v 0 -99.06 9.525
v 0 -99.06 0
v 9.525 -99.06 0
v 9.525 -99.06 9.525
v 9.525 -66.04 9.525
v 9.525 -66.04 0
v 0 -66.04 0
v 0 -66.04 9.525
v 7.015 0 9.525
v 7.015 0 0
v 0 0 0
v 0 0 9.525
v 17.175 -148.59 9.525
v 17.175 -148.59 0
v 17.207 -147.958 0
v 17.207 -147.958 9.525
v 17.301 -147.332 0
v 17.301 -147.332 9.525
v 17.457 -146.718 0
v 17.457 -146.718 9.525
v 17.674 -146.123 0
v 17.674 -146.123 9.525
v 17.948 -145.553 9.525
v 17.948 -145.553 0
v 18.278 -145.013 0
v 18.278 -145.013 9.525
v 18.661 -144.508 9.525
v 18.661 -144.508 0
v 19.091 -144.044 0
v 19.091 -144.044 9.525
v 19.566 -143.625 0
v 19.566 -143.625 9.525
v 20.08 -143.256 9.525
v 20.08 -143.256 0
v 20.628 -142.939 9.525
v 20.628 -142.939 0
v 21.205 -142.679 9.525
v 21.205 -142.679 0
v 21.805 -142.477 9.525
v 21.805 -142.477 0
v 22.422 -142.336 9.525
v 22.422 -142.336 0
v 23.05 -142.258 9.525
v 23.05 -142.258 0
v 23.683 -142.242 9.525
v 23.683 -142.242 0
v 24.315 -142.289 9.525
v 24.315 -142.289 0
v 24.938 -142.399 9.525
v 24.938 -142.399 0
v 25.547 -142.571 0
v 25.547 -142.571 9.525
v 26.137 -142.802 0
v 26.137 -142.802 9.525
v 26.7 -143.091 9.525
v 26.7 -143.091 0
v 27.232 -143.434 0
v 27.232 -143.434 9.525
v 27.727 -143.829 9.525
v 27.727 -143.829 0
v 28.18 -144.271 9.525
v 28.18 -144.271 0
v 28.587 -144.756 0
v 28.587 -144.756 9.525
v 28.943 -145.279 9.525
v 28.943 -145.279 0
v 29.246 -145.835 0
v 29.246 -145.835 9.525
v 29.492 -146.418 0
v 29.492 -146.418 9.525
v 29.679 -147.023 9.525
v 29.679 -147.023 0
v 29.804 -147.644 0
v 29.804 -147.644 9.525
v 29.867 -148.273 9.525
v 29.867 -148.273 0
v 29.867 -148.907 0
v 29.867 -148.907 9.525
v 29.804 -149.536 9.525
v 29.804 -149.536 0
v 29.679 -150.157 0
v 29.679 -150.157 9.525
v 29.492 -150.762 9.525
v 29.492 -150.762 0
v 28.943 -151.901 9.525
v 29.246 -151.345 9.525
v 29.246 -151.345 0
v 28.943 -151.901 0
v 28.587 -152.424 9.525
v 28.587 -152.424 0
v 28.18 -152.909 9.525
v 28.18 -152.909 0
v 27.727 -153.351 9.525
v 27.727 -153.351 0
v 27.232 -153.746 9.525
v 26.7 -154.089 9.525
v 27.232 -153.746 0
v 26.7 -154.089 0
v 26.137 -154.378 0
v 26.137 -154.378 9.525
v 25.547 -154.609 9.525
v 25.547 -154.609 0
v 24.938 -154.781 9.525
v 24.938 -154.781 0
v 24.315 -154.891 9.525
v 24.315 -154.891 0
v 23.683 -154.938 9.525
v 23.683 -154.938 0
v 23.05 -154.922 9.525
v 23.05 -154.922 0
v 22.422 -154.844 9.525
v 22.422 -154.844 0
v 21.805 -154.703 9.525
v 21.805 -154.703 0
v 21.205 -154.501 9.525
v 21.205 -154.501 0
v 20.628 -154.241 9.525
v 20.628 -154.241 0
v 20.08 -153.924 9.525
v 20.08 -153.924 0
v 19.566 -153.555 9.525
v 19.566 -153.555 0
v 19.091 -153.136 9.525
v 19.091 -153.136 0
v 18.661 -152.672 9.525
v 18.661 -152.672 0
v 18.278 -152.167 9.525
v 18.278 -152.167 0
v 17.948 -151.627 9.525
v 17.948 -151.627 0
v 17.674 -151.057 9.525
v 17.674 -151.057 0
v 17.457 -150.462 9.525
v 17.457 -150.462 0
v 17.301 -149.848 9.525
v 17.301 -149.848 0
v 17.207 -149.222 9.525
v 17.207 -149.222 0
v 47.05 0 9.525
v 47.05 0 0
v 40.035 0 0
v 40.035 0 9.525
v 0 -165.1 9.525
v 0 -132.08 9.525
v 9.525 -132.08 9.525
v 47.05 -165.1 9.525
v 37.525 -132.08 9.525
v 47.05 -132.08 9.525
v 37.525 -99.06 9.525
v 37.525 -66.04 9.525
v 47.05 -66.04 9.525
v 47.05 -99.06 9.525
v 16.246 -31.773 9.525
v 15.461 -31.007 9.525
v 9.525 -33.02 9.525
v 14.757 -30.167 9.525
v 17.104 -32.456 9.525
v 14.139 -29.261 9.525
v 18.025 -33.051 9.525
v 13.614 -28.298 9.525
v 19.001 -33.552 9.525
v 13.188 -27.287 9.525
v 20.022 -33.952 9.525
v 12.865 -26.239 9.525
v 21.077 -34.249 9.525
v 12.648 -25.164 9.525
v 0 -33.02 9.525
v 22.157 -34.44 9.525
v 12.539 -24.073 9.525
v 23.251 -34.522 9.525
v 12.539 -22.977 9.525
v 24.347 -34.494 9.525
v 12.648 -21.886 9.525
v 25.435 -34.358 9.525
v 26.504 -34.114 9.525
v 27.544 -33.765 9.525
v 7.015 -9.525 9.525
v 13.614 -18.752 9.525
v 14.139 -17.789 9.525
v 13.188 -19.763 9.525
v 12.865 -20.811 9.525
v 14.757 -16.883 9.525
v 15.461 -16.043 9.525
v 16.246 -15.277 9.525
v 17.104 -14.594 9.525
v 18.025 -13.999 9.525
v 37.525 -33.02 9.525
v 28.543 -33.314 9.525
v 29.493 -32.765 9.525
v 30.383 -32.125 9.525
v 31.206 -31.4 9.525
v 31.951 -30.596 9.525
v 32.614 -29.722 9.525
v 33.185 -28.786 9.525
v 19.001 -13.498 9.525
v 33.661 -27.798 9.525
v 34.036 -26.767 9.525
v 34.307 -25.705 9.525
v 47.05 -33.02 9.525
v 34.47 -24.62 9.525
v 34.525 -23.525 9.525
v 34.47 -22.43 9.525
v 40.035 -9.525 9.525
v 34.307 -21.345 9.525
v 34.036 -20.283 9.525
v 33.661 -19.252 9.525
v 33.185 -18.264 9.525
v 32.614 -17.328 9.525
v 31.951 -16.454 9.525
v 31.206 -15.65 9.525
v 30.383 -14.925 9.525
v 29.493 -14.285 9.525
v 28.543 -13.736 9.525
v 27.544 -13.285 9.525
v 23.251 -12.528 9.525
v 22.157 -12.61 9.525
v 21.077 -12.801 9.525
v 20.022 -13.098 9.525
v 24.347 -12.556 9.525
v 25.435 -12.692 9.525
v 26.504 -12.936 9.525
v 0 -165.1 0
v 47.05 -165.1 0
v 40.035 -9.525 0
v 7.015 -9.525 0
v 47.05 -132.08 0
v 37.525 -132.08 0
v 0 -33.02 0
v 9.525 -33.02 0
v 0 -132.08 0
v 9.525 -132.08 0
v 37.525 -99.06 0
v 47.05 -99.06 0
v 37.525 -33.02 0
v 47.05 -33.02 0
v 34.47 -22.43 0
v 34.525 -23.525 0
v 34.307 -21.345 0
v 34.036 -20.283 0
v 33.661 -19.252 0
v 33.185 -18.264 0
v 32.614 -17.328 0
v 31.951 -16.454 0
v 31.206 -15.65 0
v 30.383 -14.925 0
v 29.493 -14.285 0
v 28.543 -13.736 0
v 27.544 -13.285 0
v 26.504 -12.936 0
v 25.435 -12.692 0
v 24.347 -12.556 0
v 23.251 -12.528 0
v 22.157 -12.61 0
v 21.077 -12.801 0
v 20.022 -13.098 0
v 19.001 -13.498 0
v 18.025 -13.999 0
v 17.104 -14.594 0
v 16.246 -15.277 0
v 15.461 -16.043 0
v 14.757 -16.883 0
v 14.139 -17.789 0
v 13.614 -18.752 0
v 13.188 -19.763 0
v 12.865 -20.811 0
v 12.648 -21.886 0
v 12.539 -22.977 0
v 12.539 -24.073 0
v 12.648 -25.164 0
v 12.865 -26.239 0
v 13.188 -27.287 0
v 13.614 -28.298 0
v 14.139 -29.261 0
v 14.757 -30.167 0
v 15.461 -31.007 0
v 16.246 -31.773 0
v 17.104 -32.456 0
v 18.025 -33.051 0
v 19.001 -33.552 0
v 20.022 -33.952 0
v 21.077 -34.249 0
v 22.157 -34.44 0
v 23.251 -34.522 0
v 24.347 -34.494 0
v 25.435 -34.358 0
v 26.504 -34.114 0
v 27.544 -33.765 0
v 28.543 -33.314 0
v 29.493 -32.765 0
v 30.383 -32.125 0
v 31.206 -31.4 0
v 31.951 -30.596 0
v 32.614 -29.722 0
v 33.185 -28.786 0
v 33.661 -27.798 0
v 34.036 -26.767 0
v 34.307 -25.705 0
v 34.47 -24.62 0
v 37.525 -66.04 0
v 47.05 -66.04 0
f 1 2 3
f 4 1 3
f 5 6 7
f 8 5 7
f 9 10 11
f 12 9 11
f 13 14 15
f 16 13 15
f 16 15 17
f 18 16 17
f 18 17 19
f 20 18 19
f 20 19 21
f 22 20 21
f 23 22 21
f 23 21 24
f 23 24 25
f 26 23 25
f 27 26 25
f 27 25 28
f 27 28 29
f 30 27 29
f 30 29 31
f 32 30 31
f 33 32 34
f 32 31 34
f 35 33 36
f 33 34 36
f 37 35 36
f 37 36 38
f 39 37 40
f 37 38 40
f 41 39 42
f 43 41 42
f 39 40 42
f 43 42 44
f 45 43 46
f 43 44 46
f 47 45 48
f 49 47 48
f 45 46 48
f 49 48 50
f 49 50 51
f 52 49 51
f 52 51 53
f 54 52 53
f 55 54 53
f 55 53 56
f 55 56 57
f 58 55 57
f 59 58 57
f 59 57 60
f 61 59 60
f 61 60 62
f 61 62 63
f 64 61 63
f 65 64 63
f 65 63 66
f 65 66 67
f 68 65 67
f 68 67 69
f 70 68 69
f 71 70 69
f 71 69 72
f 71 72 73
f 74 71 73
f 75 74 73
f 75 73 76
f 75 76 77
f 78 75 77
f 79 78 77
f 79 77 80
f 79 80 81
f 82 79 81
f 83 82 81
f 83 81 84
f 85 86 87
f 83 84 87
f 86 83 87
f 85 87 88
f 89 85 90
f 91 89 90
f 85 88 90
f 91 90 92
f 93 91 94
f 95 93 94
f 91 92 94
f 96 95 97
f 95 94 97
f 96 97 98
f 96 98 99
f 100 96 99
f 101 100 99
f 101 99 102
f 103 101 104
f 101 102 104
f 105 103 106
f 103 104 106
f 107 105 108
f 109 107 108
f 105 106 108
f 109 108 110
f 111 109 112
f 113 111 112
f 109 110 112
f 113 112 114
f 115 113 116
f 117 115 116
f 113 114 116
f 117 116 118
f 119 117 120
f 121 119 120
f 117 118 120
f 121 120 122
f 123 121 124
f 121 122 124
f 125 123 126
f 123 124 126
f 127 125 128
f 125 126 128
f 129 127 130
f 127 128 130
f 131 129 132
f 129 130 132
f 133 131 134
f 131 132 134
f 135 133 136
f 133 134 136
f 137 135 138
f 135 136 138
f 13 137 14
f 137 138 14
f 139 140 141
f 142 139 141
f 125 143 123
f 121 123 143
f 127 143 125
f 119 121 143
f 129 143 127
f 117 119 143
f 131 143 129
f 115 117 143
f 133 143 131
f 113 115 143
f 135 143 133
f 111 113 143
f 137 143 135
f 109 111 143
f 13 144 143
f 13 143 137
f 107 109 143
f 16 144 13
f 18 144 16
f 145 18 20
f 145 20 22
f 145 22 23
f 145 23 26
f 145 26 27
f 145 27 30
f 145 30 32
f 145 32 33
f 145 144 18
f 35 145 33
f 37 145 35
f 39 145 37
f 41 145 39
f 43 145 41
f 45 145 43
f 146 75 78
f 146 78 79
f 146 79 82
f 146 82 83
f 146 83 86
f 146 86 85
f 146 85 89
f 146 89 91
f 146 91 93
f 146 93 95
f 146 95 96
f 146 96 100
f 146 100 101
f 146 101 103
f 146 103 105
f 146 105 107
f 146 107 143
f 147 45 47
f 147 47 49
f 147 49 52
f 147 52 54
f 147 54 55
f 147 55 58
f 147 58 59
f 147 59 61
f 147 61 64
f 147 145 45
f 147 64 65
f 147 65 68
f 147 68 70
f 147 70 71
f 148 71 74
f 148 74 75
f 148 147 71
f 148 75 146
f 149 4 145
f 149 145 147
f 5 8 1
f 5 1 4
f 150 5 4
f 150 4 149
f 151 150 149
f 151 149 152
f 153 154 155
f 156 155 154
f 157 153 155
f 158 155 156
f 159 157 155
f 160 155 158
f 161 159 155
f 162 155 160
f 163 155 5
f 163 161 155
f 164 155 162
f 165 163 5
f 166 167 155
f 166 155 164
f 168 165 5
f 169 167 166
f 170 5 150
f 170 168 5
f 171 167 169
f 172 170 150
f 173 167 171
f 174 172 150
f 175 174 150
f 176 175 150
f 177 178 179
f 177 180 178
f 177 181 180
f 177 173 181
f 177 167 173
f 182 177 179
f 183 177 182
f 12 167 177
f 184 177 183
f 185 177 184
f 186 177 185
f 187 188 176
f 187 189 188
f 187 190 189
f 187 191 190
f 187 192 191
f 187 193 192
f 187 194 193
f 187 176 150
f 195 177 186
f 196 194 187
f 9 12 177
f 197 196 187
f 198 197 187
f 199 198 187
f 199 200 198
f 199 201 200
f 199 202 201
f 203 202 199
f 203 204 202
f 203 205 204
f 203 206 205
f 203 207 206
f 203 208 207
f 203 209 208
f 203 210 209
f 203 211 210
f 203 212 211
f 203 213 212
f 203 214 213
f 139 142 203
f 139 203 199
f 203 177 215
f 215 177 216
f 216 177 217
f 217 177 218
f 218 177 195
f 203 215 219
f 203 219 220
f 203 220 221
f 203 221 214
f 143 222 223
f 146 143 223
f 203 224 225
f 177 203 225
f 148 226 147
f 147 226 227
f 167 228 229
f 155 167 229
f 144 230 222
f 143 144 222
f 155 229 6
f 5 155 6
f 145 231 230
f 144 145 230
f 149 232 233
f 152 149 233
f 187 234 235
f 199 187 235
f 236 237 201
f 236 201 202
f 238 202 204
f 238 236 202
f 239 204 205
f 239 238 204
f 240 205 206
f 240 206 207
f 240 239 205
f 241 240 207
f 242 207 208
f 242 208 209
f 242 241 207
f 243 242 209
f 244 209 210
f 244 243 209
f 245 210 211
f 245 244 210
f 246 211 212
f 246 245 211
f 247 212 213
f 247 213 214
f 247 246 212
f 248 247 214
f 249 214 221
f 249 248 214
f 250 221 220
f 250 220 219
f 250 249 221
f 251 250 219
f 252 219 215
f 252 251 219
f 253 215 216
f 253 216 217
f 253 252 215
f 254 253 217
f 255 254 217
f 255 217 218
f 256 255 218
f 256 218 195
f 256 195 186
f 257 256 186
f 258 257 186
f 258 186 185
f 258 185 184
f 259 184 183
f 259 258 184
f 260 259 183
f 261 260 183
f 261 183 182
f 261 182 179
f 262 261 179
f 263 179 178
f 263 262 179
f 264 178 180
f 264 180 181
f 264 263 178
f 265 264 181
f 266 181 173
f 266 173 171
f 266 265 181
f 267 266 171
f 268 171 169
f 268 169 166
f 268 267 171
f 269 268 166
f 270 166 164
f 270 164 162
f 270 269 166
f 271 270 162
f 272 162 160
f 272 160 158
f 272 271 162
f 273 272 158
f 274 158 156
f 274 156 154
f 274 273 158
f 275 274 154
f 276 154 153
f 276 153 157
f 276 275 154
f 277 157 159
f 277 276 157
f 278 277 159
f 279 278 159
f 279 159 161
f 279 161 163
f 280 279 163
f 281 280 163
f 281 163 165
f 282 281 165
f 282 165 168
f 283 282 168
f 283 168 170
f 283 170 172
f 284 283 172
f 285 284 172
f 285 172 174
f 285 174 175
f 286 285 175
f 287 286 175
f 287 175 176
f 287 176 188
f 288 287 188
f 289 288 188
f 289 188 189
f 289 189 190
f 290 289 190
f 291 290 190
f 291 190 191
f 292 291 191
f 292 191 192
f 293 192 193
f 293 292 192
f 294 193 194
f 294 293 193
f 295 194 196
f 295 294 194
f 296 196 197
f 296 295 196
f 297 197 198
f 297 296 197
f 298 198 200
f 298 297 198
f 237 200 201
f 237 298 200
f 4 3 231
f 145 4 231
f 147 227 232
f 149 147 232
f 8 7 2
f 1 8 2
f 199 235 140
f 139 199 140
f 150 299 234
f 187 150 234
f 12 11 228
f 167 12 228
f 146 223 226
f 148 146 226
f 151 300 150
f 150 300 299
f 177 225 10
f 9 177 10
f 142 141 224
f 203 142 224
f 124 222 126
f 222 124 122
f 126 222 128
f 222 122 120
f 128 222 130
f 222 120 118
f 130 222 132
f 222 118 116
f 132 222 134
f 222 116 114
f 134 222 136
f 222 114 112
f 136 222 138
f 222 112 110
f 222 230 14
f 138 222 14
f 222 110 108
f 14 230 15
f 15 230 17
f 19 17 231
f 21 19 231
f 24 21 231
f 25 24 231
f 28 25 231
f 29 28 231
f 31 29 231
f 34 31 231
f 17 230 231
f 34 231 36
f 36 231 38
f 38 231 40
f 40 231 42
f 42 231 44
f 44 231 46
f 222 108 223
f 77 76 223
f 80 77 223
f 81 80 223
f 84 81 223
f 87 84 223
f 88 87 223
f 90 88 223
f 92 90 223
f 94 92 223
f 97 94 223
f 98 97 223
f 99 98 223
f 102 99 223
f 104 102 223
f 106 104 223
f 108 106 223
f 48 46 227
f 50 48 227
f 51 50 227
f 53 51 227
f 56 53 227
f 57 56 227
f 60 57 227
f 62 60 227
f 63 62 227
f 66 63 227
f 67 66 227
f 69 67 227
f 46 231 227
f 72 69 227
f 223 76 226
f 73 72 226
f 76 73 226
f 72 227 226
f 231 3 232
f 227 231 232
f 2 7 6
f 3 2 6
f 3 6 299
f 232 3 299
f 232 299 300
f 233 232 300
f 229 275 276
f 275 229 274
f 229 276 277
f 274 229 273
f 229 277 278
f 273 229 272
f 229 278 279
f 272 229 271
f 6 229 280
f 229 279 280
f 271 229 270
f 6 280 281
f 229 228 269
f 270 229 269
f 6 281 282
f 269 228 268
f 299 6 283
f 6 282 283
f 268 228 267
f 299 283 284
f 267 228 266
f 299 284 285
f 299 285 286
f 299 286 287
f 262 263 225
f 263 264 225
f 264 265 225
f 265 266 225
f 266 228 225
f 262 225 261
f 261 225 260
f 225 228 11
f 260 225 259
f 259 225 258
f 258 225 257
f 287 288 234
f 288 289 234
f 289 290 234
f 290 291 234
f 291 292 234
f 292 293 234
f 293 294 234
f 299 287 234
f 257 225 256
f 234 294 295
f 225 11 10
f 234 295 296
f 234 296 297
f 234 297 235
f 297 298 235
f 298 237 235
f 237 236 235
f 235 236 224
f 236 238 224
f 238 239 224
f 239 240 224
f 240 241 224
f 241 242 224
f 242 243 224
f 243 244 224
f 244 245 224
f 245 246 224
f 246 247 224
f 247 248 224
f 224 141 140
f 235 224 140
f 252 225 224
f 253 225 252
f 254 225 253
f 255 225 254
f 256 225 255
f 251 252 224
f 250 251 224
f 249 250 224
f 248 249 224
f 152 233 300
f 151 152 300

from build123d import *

# Parameters (mm, degrees)
SKETCH1_R               = 11
BOSS_EXTRUDE1_DEPTH     = 9.525
SKETCH3_R               = 6.35
CUT_EXTRUDE1_DEPTH      = 1
CUT_EXTRUDE1_DEPTH_BACK = 10.525


with BuildPart() as part:
    # Sketch1 → Boss-Extrude1 (new body)
    with BuildSketch(Plane.XY):
        Polygon((0, 0), (0, -33.02), (9.525, -33.02), (9.525, -66.04), (0, -66.04), (0, -99.06), (9.525, -99.06), (9.525, -132.08), (0, -132.08), (0, -165.1), (47.05, -165.1), (47.05, -132.08), (37.525, -132.08), (37.525, -99.06), (47.05, -99.06), (47.05, -66.04), (37.525, -66.04), (37.525, -33.02), (47.05, -33.02), (47.05, 0), (40.03499994, 0), (40.03499994, -9.525), (7.01499994, -9.525), (7.01499994, 0), align=None)
        with Locations((23.525, -23.525)):
            Circle(SKETCH1_R, mode=Mode.SUBTRACT)
    extrude(amount=BOSS_EXTRUDE1_DEPTH)

    # Sketch3 → Cut-Extrude1 (cut, two sides)
    with BuildSketch(Plane(origin=(0, 0, 0), x_dir=(-1, 0, 0), z_dir=(0, 0, -1))) as cut_extrude1_sk:
        with Locations((-23.525, -148.59)):
            Circle(SKETCH3_R)
    extrude(amount=CUT_EXTRUDE1_DEPTH, mode=Mode.SUBTRACT)
    extrude(cut_extrude1_sk.sketch, amount=-CUT_EXTRUDE1_DEPTH_BACK, mode=Mode.SUBTRACT)


solid = part.part
